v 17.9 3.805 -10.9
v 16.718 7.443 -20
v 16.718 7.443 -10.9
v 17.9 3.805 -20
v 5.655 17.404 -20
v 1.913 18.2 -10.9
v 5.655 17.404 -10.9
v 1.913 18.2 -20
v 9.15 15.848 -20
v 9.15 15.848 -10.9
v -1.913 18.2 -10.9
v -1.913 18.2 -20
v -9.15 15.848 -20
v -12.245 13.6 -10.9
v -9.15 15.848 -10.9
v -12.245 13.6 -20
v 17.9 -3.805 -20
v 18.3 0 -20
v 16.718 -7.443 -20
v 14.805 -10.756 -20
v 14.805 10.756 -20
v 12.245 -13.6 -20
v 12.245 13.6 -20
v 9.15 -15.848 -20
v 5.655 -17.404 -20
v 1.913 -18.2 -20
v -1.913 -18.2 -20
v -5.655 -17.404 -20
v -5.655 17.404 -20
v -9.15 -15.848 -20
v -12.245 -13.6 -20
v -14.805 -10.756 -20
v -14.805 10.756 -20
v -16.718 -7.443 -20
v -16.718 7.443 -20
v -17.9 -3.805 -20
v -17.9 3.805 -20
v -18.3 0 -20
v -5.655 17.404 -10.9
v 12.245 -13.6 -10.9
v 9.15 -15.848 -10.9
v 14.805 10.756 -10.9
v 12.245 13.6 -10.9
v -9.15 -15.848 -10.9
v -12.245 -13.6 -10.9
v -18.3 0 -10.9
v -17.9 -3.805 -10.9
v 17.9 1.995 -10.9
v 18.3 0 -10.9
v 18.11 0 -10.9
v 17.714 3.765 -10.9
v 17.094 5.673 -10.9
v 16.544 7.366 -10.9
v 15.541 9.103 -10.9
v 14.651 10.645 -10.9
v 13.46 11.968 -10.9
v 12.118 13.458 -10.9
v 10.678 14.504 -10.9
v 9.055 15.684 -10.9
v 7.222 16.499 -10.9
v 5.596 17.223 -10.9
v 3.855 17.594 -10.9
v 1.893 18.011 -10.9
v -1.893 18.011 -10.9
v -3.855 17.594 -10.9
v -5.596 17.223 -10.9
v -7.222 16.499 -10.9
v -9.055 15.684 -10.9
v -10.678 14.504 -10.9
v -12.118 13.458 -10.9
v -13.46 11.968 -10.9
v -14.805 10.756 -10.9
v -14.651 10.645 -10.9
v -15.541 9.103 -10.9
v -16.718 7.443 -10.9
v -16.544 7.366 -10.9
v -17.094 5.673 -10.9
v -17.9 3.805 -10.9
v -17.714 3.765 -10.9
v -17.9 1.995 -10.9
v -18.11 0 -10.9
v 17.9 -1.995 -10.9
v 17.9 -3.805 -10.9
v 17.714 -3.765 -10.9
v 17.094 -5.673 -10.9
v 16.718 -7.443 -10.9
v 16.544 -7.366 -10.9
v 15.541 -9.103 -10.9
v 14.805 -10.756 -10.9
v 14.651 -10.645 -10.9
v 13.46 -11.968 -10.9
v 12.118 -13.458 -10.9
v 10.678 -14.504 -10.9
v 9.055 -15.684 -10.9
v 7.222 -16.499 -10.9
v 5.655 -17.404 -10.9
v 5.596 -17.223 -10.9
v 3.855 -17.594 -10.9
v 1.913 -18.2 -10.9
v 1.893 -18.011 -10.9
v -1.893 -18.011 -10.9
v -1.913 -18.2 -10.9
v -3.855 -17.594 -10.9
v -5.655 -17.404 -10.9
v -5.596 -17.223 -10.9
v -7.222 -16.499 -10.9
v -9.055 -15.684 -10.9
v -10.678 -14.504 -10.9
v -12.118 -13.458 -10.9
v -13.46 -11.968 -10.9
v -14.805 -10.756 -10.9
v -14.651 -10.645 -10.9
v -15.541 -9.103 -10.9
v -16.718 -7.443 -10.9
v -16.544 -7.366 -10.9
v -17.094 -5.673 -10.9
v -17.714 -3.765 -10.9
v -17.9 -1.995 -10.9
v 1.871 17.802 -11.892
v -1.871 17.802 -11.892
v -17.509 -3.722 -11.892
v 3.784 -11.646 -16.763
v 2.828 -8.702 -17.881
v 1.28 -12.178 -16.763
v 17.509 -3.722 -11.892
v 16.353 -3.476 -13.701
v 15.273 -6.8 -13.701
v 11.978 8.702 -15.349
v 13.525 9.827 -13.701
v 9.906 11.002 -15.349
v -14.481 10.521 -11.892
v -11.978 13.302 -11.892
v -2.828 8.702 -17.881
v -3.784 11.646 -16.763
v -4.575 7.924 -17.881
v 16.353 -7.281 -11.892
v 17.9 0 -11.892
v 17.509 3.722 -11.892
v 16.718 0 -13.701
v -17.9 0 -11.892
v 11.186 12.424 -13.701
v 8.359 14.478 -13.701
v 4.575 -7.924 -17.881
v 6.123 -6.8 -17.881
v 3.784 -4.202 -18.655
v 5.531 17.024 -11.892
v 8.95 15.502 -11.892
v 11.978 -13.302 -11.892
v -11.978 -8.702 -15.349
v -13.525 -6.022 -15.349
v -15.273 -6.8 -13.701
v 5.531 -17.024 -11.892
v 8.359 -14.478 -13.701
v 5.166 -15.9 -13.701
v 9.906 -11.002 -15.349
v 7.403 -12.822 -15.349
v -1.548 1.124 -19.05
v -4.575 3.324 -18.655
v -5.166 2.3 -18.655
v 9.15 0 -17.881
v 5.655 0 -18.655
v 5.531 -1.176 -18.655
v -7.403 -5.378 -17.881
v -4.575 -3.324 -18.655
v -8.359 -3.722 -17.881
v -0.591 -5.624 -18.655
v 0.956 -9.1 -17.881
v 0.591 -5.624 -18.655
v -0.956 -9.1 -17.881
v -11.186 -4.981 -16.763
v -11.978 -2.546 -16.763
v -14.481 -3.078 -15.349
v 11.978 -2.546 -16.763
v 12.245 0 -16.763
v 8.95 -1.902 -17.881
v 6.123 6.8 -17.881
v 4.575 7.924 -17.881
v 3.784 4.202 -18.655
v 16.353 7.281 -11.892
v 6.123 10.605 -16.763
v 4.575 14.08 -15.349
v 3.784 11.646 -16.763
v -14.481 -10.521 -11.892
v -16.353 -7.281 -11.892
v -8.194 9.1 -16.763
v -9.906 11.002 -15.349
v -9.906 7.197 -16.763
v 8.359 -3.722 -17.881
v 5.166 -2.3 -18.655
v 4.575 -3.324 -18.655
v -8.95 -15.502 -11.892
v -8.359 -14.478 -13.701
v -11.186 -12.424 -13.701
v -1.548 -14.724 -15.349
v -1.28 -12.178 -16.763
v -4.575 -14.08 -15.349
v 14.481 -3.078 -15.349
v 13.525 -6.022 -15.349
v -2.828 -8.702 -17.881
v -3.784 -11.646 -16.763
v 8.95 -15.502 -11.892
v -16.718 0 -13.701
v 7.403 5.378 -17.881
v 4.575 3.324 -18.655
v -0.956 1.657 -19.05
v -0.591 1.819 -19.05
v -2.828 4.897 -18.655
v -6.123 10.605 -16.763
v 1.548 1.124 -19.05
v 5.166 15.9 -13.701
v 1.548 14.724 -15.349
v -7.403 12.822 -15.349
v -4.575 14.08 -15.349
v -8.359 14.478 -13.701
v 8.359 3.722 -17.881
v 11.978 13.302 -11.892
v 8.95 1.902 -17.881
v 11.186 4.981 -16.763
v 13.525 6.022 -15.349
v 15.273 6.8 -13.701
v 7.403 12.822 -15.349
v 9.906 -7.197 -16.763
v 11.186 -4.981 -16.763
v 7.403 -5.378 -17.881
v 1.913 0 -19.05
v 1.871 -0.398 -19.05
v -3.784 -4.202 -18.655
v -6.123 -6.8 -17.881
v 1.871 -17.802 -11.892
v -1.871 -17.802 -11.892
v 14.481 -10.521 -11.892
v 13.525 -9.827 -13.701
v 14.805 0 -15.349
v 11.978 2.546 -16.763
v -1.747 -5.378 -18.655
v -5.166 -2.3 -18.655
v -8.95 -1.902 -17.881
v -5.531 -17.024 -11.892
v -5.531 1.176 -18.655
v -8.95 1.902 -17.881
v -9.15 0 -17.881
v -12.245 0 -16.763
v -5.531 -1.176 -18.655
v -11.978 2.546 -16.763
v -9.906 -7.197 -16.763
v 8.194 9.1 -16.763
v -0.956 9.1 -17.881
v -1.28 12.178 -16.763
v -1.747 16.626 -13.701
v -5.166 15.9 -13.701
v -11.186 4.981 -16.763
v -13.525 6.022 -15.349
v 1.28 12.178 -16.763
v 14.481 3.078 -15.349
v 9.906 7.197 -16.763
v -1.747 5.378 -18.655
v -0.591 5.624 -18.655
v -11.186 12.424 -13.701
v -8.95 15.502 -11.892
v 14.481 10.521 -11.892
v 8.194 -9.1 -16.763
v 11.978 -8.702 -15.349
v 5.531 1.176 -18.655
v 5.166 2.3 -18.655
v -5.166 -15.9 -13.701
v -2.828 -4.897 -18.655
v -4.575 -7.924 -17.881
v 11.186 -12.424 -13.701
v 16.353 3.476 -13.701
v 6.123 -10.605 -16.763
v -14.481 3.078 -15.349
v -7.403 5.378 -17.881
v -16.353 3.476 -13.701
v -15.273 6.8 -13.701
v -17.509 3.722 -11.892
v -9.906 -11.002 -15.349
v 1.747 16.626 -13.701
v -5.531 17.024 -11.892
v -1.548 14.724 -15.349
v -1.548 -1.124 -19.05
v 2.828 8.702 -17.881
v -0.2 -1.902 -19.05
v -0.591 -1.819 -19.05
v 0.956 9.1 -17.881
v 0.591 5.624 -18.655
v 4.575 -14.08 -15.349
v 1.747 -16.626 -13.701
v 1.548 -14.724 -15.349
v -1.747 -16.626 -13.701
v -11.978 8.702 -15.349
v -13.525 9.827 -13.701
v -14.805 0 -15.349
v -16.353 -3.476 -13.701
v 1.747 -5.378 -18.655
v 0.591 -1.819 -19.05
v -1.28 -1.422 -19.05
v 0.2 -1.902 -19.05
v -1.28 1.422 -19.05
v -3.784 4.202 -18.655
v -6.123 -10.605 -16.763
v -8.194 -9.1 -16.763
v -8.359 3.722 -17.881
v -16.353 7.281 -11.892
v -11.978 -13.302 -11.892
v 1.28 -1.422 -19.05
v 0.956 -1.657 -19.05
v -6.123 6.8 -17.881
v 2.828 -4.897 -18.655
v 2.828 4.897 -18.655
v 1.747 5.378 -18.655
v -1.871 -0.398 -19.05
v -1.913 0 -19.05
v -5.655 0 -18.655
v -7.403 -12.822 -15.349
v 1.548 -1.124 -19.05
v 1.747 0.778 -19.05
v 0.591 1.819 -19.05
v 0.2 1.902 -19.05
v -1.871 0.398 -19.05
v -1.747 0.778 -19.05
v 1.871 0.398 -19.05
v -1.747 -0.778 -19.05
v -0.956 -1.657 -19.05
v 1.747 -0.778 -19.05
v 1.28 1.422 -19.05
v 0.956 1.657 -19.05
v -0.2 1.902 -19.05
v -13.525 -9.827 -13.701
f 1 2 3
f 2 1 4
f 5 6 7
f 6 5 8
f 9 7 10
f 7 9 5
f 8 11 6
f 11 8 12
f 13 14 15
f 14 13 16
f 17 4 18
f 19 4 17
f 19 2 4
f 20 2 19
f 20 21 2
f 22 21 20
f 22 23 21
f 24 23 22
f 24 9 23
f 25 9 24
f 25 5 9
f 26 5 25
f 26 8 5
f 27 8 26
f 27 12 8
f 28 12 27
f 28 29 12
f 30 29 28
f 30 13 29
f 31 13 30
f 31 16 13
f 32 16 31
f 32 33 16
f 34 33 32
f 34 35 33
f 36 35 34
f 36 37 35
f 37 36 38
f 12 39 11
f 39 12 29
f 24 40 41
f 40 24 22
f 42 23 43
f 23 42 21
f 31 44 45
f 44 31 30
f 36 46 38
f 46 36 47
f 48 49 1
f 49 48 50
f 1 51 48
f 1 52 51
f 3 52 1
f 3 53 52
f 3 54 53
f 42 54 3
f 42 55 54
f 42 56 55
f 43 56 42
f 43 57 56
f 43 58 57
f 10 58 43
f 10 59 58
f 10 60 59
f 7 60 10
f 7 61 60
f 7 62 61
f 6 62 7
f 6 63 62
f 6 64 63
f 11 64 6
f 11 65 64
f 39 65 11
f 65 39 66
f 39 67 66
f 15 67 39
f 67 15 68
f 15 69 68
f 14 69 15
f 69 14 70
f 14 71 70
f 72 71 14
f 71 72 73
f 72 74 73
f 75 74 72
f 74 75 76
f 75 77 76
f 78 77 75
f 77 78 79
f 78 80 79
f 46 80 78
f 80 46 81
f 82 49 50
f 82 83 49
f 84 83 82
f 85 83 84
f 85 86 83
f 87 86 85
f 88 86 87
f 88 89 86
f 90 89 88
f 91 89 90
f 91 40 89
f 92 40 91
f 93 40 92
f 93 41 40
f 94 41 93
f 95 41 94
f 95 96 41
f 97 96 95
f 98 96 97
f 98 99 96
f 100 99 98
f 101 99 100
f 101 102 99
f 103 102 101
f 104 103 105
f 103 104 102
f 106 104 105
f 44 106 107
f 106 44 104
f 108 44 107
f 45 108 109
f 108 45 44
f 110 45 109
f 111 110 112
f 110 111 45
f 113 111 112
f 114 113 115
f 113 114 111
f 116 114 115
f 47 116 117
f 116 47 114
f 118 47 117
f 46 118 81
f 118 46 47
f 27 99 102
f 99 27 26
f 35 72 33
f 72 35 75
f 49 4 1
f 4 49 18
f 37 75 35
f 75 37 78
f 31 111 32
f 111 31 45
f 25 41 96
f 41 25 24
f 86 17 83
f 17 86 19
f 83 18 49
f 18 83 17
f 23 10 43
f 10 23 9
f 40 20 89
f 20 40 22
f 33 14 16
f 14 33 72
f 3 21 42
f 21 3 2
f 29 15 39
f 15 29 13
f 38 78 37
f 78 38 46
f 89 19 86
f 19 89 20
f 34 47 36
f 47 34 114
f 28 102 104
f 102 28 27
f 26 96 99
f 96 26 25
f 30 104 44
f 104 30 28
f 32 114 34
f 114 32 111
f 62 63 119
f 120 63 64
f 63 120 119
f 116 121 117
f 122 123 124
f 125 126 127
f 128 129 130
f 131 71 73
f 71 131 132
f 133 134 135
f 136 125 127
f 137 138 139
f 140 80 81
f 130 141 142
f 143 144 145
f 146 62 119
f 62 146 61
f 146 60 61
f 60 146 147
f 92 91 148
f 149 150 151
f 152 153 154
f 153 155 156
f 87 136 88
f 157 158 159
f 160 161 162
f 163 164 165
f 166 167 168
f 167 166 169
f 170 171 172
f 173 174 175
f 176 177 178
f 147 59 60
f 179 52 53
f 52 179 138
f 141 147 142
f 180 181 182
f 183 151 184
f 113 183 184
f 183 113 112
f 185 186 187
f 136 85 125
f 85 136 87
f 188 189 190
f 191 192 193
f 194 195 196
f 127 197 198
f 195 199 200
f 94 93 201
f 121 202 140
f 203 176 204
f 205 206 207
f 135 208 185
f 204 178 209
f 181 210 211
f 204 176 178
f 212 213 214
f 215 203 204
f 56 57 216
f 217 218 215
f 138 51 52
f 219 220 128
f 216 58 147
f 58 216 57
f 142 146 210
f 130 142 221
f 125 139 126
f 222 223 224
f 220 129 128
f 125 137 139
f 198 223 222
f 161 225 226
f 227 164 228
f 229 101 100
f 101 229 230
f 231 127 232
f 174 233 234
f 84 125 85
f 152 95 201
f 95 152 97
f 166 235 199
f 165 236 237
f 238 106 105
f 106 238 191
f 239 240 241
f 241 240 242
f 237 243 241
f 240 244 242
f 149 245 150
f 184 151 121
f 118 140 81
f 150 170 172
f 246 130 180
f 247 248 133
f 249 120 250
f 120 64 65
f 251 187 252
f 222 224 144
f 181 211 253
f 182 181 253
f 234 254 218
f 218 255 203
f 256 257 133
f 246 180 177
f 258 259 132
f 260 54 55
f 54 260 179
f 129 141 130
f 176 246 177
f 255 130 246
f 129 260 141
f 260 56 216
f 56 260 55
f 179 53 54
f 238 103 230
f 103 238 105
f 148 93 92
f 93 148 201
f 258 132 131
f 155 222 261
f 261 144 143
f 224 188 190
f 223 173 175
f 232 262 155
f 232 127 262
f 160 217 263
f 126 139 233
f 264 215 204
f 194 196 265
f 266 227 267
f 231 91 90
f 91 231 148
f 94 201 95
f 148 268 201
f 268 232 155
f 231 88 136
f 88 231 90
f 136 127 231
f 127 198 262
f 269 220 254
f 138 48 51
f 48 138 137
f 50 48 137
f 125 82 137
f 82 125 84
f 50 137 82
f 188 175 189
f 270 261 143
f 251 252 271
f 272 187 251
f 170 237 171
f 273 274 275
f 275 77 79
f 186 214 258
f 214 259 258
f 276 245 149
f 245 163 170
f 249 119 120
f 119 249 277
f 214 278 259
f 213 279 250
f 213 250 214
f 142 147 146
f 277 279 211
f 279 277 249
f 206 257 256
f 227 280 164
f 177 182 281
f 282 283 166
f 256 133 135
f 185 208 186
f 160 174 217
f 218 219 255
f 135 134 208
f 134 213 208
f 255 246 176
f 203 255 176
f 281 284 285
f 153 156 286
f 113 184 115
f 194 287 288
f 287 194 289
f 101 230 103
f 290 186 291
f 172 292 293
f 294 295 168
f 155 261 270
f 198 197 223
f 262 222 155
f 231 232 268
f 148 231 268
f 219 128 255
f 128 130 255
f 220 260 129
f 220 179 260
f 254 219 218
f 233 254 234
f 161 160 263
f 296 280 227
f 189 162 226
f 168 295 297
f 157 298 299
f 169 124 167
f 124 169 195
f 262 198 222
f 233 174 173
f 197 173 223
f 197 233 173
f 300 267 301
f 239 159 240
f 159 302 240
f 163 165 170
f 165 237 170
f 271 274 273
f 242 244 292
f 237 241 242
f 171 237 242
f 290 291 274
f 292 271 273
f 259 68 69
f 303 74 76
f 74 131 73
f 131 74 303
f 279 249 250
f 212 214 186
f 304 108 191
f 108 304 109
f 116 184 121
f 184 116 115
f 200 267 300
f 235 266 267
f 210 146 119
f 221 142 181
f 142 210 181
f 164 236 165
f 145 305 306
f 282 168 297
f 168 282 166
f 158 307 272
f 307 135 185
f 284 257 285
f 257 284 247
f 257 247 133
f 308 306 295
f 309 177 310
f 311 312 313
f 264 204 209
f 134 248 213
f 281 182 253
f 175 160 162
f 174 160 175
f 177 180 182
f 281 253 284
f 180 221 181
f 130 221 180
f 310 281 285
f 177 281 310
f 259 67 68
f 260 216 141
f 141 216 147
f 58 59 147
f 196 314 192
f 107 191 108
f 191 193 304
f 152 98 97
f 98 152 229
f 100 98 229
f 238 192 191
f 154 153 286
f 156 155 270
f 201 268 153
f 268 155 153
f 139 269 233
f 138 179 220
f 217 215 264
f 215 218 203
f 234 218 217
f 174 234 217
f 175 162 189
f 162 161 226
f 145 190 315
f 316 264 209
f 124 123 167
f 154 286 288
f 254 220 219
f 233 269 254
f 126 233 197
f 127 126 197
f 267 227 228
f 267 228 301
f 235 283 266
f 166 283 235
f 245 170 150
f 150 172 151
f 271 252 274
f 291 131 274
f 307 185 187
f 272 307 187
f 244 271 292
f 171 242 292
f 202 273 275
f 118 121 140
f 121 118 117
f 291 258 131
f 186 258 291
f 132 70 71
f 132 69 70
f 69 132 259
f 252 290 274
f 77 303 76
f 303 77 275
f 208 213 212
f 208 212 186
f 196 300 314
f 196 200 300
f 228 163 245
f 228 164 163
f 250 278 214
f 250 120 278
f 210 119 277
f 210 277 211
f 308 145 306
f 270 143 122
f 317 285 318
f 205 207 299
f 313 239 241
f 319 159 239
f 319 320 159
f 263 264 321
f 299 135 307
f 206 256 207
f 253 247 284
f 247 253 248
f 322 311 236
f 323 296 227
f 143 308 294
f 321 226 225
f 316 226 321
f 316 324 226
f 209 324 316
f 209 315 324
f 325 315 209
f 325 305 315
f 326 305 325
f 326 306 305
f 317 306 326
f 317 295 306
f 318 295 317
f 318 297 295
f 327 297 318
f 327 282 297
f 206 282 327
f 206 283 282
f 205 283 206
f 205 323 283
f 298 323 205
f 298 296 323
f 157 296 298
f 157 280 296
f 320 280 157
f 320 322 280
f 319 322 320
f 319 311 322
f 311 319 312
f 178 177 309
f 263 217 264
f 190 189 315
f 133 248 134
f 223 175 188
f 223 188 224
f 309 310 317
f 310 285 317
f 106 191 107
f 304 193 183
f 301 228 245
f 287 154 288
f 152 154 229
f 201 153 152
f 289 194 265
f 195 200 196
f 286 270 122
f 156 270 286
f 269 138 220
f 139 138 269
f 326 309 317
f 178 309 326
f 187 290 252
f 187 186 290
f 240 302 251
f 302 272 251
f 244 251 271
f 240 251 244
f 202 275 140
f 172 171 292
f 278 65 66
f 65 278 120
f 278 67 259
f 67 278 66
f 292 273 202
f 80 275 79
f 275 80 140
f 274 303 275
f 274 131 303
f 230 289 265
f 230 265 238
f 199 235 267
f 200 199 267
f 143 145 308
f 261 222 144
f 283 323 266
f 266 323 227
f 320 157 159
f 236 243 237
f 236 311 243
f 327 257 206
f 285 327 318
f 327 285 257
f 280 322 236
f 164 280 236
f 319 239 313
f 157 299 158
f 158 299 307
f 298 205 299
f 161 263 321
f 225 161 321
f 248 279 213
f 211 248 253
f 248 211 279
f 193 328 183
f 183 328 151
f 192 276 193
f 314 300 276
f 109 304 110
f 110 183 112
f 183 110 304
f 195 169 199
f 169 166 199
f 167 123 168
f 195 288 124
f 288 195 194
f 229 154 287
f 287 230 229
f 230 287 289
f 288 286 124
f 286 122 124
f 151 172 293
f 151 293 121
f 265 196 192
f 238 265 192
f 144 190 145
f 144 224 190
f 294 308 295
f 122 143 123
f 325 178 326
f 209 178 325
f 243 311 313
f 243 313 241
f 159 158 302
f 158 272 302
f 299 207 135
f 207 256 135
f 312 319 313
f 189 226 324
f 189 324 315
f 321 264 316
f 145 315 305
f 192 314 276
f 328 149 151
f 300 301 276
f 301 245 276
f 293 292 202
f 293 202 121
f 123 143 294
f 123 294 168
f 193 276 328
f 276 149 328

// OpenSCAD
//////////////////////////////////////////////
//  ***TeMoG - Tentacle Mold Generator***   //
//  by Jonas Jørgensen (jonj@sdu.dk) 2020   //
//                                          //
//  Shared under a Creative Commons         //
//  Attribution-ShareAlike (CC BY-SA 3.0)   //
//  license                                 //
//////////////////////////////////////////////

//Part 3b - Top Piece - rounded tip version

$fn=30; //Set to 200 when generating the molds for 3D printing

//Main cone and mold
minDiam = 35; //Cone


//Bottom
straightHeightBottom = 20;
LDRHolderThickness= 10-0.5; //*MODIFIED
LDRHolderDiam= minDiam+3-1;//*MODIFIED
delta=0.4; //Inaccuracy of printer (layering and overextrusion)

//Round top LDR holder
difference(){
rotate (60) translate ([0,0,-straightHeightBottom]) cylinder(LDRHolderThickness-delta,d2=LDRHolderDiam-delta,d1=LDRHolderDiam-delta);
translate([0,0,-straightHeightBottom/2]) scale([1,1,2*(LDRHolderThickness-delta)/(LDRHolderDiam-delta)]) sphere(r = (LDRHolderDiam-delta)/2);
}
